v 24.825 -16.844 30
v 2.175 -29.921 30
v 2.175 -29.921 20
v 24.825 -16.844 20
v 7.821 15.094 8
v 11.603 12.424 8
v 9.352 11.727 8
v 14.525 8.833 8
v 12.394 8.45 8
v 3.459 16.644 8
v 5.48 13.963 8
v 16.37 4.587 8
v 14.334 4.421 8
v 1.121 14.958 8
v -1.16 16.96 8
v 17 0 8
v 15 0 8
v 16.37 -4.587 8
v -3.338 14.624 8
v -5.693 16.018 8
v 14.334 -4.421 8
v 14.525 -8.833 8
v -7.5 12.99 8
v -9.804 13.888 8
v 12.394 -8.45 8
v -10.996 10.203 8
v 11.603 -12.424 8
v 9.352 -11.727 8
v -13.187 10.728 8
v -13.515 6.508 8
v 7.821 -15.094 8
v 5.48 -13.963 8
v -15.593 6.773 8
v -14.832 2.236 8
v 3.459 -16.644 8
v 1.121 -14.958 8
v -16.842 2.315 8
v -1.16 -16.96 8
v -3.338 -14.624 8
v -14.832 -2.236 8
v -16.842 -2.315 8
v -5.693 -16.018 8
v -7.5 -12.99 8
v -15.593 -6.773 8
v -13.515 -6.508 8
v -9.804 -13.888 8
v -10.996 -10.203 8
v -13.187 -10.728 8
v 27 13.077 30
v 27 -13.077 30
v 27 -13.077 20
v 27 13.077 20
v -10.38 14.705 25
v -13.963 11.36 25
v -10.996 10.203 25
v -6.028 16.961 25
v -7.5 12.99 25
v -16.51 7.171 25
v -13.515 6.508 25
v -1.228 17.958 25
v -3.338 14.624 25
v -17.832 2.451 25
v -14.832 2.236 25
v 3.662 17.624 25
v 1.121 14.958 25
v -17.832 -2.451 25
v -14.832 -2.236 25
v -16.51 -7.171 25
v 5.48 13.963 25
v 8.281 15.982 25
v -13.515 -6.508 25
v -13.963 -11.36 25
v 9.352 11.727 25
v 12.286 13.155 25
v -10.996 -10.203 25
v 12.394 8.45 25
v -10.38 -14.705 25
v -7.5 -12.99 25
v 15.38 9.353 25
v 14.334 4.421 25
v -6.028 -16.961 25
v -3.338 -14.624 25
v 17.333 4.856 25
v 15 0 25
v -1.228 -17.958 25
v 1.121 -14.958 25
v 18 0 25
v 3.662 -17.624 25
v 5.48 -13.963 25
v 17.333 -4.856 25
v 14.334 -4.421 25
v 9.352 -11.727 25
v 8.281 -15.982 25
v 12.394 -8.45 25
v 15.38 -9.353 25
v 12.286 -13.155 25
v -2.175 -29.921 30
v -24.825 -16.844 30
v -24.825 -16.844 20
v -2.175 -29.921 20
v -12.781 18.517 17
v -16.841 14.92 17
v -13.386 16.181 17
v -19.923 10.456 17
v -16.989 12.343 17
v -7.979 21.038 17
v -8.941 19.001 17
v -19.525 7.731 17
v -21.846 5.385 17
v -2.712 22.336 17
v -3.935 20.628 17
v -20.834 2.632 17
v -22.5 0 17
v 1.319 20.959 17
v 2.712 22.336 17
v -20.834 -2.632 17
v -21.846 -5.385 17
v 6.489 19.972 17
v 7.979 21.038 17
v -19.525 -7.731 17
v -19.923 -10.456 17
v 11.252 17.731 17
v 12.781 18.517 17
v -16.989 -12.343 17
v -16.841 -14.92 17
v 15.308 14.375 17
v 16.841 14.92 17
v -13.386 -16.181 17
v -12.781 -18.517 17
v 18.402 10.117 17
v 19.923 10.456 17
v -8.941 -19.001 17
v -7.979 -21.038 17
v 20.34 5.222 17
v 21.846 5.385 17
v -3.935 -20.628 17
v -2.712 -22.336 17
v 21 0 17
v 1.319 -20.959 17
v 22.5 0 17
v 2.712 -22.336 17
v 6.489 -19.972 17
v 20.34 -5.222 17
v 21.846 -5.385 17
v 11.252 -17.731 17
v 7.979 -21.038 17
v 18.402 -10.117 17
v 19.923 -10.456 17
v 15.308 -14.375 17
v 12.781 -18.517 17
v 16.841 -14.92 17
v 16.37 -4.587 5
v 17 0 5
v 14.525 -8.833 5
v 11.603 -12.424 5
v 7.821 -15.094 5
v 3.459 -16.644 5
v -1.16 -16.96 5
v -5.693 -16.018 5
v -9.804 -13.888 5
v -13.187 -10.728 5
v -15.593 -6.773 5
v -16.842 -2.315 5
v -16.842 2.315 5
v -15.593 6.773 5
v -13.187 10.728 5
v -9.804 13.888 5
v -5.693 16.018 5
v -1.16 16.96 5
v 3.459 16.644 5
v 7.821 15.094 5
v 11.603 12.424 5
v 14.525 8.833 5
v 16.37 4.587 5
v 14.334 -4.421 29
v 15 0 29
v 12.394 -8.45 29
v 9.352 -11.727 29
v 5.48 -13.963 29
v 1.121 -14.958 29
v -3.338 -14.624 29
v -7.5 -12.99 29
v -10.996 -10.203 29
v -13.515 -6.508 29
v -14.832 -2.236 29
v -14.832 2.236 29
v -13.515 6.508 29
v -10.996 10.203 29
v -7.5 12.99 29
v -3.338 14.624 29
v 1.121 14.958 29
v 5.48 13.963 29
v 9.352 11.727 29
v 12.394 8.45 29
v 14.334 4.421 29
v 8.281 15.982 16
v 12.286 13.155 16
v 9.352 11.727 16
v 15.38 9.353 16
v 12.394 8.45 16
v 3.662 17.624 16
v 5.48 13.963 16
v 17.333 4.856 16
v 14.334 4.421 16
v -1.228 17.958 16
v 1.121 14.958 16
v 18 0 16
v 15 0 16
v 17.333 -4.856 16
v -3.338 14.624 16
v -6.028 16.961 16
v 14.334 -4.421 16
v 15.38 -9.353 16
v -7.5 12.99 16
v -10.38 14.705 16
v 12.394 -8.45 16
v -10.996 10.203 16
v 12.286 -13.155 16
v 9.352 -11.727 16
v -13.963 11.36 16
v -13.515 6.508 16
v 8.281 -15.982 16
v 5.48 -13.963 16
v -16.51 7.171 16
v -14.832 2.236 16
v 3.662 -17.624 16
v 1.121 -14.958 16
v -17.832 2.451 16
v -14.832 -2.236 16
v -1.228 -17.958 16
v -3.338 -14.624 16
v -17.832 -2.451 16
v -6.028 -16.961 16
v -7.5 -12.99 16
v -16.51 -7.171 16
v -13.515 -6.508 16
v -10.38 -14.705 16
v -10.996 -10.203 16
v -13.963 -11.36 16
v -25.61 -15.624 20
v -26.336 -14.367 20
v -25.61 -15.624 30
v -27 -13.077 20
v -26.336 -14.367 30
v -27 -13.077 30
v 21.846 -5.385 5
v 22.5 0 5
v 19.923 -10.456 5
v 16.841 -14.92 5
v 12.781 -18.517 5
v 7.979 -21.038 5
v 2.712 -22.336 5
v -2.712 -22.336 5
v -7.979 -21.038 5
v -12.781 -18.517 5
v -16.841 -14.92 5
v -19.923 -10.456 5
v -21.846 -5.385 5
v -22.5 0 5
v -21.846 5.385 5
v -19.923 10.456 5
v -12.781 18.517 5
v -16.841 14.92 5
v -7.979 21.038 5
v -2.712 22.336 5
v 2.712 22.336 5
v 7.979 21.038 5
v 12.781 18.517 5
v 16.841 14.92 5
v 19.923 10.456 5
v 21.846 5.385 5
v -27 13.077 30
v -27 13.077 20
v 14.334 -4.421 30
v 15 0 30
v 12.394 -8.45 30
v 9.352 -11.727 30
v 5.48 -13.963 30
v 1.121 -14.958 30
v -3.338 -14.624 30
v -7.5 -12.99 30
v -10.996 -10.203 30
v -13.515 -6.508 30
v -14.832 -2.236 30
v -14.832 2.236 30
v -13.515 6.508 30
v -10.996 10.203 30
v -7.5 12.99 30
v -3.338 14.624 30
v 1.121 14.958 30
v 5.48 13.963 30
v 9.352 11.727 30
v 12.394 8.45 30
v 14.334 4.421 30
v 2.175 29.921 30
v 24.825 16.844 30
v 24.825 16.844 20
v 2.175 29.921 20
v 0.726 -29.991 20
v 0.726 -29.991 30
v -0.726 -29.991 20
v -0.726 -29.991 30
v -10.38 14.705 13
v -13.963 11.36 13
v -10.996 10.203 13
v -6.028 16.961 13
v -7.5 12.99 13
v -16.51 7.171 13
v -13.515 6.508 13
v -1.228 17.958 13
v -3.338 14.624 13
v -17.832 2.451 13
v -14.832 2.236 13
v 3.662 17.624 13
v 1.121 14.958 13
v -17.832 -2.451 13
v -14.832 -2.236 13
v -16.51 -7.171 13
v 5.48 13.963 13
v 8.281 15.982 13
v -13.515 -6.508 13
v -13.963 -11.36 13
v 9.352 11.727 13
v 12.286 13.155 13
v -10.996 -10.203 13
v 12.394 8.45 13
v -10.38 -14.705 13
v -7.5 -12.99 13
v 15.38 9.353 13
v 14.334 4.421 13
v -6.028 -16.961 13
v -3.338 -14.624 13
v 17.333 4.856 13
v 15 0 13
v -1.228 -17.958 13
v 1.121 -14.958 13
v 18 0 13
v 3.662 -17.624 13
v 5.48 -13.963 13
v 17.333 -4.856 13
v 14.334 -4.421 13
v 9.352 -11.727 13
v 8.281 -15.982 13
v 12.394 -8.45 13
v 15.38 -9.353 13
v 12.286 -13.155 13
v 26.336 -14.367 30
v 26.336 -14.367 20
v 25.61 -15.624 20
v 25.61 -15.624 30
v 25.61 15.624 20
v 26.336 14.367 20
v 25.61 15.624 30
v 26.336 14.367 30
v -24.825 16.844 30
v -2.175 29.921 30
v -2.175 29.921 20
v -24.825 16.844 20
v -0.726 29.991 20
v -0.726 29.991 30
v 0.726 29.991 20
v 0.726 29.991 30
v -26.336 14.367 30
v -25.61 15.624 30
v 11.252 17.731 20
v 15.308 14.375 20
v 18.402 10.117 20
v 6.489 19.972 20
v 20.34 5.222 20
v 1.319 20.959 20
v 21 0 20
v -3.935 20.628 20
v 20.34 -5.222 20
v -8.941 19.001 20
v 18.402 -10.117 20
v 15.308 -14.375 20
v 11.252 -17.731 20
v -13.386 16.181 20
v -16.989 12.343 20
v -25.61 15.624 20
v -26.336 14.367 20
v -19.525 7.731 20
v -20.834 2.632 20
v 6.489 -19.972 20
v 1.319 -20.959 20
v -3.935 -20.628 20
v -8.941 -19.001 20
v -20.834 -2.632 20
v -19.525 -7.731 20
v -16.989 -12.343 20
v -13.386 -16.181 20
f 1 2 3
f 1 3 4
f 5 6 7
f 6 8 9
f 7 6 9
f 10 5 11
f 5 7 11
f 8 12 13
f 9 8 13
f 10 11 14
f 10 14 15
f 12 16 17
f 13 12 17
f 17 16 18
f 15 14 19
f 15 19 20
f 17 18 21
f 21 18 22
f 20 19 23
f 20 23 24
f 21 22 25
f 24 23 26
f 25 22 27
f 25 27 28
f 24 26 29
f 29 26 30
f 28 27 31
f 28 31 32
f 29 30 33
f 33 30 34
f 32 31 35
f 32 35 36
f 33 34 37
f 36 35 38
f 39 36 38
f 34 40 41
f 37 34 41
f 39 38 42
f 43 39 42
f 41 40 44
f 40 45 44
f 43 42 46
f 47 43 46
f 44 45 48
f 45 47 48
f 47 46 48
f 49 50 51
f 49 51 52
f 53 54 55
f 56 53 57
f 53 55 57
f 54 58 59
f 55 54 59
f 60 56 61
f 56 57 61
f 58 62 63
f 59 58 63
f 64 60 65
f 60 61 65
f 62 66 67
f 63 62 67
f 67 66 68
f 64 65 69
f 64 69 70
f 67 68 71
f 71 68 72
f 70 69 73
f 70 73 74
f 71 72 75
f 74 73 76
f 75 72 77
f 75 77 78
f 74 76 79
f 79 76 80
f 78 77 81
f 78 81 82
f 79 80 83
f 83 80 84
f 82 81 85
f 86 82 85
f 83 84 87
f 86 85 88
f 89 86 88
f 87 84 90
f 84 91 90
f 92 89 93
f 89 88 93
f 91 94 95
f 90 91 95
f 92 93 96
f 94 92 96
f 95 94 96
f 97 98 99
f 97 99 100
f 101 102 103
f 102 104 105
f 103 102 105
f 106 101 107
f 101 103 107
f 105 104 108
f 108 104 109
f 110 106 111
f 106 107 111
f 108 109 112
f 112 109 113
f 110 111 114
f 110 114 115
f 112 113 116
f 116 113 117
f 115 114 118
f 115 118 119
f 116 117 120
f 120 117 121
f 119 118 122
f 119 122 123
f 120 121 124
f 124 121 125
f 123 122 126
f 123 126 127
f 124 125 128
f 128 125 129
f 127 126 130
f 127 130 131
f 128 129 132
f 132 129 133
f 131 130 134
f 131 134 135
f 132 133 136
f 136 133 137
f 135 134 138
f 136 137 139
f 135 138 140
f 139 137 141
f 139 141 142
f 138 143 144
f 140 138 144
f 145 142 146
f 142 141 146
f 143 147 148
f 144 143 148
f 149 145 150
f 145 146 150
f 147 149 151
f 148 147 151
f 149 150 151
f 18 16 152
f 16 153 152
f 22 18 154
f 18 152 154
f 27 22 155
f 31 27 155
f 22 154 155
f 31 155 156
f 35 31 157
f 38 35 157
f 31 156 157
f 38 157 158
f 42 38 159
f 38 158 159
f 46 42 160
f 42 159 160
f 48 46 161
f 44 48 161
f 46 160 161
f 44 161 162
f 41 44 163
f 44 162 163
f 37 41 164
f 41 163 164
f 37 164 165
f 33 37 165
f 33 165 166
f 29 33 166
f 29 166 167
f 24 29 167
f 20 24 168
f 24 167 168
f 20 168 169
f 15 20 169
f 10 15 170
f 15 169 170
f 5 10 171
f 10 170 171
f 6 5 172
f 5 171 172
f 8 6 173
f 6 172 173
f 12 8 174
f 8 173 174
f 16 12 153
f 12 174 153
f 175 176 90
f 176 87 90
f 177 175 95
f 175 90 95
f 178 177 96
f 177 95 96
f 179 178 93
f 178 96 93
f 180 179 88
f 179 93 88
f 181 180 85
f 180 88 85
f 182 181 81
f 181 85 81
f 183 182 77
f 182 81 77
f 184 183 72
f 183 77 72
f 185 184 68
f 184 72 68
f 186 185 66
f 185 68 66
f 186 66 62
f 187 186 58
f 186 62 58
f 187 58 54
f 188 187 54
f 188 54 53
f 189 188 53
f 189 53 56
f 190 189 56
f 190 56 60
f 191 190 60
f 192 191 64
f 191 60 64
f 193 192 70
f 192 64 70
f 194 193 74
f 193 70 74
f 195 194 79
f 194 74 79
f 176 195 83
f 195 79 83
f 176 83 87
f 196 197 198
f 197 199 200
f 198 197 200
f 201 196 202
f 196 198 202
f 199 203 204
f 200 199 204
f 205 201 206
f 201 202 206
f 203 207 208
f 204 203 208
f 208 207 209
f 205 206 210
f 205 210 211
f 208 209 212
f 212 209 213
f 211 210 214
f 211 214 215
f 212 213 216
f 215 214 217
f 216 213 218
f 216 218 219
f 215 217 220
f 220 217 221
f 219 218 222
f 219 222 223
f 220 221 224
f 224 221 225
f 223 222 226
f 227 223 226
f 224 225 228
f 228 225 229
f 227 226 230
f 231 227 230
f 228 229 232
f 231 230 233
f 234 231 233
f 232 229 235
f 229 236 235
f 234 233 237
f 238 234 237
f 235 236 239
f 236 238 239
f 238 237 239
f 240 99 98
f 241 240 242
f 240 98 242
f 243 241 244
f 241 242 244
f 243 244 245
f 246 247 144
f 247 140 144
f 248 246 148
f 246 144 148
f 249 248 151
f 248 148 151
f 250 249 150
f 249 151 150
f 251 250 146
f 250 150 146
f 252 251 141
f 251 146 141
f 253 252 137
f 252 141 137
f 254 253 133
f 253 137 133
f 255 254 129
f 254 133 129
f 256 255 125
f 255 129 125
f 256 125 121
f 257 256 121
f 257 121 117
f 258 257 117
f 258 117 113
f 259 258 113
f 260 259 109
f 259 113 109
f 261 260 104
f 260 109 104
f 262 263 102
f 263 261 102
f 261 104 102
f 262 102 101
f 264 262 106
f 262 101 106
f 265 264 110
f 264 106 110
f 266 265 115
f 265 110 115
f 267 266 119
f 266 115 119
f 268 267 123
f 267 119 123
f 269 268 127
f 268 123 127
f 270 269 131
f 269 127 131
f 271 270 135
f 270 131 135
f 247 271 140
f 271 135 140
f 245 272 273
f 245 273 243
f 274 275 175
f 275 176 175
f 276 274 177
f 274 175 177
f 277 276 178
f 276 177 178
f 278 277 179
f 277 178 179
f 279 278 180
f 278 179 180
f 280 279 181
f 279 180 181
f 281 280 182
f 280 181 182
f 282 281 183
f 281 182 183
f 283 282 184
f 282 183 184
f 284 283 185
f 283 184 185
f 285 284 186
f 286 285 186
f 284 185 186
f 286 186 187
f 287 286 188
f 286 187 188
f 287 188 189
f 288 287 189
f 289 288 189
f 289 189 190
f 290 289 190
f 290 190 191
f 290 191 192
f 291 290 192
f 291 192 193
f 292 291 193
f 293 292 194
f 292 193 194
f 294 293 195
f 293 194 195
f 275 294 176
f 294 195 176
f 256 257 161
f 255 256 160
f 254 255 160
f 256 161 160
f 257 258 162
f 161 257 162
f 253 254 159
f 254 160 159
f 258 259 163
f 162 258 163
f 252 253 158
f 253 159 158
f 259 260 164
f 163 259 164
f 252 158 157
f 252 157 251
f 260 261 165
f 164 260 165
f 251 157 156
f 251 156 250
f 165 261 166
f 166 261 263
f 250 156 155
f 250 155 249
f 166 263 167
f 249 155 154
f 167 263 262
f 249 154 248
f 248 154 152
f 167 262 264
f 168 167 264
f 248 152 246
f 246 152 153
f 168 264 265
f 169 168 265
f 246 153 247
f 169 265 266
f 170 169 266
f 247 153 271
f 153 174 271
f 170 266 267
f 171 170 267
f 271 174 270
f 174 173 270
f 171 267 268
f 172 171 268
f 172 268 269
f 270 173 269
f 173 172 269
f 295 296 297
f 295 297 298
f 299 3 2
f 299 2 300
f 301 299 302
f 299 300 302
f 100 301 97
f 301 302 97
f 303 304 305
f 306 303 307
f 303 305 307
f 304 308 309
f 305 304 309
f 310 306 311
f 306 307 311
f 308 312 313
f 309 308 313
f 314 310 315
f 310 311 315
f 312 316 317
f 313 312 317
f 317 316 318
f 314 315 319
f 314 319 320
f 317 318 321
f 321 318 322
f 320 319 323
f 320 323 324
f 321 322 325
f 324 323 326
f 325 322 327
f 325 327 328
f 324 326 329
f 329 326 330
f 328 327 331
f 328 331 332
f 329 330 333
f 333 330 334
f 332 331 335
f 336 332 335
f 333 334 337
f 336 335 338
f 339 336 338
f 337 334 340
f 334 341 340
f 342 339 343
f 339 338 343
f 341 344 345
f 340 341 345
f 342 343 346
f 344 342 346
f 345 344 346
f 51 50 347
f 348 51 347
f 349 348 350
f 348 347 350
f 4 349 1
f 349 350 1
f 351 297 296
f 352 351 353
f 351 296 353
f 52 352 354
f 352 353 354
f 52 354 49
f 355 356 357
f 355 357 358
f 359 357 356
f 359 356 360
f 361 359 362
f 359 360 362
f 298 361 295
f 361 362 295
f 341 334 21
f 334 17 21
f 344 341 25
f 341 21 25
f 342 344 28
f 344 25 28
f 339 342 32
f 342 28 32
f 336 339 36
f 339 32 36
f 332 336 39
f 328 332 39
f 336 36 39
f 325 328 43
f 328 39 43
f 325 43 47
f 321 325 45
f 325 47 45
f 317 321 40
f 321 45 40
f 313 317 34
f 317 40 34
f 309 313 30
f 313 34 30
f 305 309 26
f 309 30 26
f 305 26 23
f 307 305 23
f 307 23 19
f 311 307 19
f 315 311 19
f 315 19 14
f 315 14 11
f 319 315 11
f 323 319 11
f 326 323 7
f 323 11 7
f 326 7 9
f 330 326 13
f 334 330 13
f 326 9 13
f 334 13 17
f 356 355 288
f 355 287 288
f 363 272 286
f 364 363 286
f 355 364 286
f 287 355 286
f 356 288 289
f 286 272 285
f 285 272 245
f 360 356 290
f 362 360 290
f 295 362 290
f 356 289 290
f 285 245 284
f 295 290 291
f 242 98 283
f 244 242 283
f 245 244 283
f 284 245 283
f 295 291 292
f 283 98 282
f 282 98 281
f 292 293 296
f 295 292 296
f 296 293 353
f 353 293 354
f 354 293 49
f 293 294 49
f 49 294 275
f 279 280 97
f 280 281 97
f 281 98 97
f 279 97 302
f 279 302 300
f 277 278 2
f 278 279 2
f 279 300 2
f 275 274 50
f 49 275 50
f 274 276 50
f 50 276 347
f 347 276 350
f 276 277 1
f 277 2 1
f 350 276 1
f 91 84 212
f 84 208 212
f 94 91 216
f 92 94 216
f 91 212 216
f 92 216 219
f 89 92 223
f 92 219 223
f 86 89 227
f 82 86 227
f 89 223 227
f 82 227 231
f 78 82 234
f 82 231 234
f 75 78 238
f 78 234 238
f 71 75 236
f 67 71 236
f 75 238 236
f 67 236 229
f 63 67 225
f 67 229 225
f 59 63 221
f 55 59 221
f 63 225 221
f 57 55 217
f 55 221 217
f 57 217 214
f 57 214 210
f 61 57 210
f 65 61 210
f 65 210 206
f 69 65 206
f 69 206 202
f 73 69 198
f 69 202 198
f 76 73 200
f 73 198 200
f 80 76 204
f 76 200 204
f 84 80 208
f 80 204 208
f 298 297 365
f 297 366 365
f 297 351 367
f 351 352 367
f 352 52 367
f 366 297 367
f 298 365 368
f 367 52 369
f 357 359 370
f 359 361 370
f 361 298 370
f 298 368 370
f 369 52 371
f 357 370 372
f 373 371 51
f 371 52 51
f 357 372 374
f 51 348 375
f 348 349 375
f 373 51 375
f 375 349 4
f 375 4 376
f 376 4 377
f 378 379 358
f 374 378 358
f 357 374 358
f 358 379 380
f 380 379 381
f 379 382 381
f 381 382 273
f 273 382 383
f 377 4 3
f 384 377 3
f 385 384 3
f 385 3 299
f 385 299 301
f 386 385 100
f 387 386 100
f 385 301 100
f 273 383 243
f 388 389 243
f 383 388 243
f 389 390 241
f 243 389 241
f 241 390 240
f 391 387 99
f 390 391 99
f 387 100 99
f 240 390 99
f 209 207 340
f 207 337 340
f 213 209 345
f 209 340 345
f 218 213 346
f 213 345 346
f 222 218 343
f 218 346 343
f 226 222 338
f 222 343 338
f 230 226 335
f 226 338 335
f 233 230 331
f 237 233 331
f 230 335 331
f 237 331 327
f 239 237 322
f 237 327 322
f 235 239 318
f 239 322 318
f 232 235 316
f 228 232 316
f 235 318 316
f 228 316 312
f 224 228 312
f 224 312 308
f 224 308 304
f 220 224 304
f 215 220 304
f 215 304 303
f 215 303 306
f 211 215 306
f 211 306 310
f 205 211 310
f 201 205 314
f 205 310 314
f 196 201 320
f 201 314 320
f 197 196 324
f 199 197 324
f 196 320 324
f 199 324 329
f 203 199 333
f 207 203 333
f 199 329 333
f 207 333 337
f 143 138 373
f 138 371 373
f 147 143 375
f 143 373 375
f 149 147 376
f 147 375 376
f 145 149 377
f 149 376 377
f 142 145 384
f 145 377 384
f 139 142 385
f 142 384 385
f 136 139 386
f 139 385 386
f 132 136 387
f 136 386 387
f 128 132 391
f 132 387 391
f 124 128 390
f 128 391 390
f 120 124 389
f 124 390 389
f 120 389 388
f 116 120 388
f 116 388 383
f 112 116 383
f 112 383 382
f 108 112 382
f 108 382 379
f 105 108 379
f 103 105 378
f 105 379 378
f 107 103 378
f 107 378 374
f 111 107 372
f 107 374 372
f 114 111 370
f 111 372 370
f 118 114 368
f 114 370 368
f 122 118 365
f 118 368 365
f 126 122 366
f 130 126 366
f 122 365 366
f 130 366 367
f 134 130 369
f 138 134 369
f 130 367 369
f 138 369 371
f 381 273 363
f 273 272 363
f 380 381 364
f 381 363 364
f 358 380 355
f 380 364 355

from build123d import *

# Parameters (mm, degrees)
F3_DEPTH = 25


with BuildPart() as f1:
    # F0 (on Front) → F1 (revolve)
    with BuildSketch(Plane.XZ):
        Polygon((15, 5), (15, 0), (22.5, 0), (22.5, 17), (21, 17), (21, 20), (30, 20), (30, 30), (15, 30), (15, 29), (18, 25), (15, 25), (15, 16), (18, 16), (18, 13), (15, 13), (15, 8), (17, 8), (17, 5), align=None)
    revolve(axis=Axis((0, 0, 16.846085), (0, 0, -1)))

    # F2 (on face) → F3 (intersect)
    with BuildSketch(Plane.XY.offset(30)):
        Polygon((0, -31.176915), (27, -15.588457), (27, 15.588457), (0, 31.176915), (-27, 15.588457), (-27, -15.588457), align=None)
    extrude(amount=-F3_DEPTH, mode=Mode.INTERSECT)


solid = f1.part
